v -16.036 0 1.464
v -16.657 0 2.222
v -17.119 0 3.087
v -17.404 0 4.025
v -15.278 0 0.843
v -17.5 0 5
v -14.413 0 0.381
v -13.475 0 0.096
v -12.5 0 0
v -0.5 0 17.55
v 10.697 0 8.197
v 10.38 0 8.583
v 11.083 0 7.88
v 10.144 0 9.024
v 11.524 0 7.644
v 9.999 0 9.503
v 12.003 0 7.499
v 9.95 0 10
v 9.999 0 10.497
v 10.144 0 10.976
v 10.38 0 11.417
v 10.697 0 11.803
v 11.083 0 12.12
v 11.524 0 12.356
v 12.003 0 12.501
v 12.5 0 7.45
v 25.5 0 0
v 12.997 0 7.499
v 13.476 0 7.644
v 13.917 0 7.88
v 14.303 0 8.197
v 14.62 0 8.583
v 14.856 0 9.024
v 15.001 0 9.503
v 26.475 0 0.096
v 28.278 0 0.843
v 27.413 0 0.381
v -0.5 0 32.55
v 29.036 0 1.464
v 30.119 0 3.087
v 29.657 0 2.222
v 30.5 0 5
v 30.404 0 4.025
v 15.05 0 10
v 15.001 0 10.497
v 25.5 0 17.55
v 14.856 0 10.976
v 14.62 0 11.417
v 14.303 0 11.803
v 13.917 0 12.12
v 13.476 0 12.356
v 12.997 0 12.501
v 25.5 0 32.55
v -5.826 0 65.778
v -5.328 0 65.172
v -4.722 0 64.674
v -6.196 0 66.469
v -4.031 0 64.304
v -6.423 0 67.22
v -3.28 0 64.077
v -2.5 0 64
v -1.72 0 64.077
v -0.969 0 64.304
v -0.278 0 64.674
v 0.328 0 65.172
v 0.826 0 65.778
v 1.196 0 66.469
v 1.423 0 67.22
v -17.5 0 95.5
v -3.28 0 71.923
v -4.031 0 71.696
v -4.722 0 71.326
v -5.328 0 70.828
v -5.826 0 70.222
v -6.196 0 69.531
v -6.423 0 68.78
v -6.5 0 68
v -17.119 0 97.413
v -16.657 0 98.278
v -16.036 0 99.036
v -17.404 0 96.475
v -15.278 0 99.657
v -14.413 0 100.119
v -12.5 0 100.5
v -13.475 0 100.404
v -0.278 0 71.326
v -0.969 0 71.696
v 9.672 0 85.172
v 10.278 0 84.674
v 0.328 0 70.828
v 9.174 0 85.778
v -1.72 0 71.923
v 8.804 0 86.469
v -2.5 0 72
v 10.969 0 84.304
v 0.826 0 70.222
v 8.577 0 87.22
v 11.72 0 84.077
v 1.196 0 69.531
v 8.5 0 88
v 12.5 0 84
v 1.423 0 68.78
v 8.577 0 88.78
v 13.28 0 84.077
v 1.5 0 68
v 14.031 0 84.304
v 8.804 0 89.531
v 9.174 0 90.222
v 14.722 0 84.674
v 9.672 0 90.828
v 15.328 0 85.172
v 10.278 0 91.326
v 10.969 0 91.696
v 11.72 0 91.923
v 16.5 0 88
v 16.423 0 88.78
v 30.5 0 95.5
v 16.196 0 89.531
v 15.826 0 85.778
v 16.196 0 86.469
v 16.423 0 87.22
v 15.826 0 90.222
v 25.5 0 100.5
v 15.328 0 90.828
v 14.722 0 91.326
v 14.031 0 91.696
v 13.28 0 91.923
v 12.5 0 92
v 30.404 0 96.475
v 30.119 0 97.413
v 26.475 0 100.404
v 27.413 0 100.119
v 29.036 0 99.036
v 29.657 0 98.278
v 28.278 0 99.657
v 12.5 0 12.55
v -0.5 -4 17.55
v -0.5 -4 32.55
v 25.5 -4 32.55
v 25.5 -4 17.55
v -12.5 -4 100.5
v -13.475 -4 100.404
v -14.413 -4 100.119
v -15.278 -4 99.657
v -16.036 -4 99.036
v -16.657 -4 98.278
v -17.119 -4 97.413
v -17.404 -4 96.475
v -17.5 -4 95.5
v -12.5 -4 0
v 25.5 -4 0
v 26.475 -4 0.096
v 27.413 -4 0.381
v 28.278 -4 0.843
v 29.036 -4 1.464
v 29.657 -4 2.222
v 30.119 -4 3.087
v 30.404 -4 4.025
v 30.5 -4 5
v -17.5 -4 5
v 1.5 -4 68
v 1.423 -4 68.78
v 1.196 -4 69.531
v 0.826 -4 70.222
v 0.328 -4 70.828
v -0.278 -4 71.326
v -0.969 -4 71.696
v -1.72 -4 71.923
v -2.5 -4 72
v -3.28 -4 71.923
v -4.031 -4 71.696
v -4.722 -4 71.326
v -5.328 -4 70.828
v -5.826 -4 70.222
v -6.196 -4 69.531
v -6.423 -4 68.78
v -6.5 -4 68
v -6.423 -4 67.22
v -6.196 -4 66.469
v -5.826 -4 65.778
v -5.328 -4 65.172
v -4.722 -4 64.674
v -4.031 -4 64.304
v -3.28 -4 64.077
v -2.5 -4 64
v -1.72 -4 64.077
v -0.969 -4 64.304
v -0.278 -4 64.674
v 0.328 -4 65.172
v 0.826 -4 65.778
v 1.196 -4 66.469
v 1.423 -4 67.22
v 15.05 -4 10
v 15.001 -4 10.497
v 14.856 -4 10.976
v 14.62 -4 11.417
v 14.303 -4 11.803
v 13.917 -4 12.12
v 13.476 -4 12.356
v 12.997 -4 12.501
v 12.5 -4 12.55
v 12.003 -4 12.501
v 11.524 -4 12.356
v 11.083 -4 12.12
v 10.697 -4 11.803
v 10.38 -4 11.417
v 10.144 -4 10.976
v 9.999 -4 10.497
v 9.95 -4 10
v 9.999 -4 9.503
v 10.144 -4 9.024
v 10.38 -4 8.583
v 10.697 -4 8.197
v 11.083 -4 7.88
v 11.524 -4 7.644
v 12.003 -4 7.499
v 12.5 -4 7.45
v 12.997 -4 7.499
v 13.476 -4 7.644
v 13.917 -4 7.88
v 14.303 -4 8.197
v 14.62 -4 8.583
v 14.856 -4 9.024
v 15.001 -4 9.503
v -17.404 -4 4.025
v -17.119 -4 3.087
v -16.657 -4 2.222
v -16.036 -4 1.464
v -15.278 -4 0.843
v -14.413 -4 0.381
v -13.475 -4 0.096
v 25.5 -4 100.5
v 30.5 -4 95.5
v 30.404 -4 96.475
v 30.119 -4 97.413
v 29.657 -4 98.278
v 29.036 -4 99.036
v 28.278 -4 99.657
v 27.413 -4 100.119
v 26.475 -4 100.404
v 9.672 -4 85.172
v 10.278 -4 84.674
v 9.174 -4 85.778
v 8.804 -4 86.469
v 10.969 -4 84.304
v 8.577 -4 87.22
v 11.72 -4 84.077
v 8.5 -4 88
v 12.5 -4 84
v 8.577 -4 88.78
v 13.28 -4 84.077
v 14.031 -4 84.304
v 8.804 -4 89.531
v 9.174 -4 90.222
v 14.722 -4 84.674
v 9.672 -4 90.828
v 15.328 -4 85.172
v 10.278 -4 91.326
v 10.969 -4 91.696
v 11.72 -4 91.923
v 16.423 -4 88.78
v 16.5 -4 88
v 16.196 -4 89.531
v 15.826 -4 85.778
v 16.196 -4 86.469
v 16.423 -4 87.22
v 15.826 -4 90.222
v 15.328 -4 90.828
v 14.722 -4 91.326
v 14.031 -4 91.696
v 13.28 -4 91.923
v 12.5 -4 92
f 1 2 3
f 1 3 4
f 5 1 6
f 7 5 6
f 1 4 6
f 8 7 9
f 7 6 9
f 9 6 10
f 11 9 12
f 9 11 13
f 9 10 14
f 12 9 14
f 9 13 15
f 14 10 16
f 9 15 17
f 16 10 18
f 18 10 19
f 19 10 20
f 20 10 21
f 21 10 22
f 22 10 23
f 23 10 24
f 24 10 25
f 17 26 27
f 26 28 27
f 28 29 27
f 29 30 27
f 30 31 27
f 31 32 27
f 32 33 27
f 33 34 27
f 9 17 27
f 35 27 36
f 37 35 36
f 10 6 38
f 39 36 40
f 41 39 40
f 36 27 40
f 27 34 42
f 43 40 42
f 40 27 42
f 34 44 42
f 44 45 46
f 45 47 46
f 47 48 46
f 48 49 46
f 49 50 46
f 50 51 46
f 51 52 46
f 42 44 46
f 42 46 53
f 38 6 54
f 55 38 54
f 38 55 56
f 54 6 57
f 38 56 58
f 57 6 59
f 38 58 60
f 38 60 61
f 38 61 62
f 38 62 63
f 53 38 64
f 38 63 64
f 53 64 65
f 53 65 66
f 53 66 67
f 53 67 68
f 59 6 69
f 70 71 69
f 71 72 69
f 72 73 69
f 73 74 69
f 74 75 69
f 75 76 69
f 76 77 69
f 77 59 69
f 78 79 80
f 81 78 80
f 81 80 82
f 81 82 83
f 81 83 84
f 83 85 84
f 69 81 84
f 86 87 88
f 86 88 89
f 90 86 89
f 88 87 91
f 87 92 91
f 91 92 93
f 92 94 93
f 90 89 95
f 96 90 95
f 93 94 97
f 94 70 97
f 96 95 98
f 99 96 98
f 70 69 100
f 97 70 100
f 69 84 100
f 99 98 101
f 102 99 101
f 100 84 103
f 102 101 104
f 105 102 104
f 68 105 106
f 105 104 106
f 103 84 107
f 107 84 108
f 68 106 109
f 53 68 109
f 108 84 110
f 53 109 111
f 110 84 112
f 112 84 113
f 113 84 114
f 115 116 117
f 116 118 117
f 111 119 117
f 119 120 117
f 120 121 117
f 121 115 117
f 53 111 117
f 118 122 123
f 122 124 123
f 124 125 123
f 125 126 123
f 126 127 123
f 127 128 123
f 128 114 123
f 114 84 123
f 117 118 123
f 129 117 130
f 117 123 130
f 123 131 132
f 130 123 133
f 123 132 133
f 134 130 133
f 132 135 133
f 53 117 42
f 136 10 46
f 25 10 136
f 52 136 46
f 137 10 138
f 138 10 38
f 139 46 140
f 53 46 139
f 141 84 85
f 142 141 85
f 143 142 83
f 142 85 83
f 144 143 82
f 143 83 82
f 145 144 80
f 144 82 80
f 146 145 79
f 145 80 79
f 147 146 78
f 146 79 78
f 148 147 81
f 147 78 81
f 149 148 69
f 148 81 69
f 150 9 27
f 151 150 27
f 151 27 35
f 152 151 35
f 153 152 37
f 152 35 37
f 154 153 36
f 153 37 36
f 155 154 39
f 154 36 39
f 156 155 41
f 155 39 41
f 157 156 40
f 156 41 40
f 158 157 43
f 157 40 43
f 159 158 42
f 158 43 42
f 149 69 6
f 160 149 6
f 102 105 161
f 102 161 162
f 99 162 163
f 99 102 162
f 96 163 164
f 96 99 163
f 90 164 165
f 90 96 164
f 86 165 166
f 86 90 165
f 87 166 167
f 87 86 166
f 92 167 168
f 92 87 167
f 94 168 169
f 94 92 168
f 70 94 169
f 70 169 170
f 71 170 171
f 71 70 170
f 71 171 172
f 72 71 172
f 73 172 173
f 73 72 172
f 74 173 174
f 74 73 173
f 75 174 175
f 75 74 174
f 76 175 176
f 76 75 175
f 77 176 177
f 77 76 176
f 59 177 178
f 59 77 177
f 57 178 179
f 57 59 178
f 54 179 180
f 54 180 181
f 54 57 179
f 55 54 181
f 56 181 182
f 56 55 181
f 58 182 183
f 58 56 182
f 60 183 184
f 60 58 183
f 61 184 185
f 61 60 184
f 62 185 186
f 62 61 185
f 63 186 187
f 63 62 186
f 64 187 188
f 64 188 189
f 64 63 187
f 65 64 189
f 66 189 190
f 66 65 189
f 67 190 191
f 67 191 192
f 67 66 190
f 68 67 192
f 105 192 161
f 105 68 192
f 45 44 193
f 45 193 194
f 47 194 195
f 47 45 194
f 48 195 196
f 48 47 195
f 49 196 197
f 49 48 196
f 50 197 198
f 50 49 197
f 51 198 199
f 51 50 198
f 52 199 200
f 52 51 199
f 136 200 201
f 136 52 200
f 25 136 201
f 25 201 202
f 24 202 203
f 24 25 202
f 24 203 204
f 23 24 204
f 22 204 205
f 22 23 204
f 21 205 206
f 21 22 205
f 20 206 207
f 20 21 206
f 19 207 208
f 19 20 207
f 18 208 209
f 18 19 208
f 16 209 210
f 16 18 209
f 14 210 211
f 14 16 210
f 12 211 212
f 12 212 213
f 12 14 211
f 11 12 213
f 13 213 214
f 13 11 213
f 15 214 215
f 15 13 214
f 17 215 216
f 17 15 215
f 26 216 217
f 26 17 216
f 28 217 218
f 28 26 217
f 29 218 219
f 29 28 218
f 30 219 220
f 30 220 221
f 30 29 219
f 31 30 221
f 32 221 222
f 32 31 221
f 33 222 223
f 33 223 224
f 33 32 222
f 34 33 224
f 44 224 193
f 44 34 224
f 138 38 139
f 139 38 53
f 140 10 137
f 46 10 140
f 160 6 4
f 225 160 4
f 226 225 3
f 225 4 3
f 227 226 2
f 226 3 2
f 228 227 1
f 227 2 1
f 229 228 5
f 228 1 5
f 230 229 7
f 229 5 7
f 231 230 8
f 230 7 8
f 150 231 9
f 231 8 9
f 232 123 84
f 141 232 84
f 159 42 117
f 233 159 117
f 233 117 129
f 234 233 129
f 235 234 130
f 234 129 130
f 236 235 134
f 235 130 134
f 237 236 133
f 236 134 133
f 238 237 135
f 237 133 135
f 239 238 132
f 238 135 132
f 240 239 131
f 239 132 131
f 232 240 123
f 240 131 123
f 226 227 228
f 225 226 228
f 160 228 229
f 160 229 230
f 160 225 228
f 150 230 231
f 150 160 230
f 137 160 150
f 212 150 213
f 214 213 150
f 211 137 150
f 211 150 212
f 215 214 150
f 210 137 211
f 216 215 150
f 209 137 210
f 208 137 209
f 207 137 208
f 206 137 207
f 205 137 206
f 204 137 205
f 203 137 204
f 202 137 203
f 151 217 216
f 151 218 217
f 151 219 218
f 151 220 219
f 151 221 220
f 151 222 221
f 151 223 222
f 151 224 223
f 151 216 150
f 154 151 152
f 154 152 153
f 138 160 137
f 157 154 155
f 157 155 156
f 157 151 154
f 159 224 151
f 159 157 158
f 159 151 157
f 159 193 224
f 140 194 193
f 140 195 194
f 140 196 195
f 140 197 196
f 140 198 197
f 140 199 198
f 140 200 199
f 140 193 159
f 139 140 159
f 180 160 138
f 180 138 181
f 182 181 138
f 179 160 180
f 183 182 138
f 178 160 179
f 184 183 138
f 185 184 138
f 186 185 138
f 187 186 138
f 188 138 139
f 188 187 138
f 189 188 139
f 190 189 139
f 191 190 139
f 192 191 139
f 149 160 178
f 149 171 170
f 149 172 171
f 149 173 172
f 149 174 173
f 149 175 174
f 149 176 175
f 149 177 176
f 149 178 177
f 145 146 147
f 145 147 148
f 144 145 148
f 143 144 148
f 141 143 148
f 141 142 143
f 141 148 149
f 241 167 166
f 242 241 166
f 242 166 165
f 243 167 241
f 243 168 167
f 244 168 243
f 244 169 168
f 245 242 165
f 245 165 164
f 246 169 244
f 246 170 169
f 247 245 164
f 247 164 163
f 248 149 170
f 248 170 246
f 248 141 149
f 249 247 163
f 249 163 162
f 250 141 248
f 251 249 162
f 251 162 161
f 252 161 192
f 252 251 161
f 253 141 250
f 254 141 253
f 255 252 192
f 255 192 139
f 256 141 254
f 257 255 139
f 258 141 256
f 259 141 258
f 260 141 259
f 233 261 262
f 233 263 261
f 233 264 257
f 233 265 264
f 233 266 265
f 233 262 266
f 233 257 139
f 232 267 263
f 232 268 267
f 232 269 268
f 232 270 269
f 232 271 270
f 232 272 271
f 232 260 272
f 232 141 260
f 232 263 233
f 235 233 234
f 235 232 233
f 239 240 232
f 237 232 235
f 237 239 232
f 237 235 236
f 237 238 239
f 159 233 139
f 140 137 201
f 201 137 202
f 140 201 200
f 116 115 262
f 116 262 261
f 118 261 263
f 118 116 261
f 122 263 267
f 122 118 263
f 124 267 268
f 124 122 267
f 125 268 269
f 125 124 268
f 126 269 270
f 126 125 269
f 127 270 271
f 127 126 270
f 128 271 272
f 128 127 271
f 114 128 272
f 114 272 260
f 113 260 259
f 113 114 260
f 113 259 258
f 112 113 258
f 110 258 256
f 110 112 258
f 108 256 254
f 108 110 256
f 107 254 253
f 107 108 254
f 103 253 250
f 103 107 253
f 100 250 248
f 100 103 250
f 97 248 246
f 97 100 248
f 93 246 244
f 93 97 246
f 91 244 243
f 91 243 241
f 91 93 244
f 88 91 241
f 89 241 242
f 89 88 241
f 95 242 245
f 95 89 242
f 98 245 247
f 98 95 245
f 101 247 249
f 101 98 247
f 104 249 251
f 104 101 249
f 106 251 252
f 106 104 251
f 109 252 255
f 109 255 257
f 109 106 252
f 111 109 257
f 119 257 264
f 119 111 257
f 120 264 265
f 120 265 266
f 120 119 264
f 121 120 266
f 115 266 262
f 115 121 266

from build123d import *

# Parameters (mm, degrees)
F0_R     = 2.55
F0_W     = 26
F0_H     = 15
F0_R_2   = 4
F1_DEPTH = 4


with BuildPart() as f1:
    # F0 (on Front) → F1 (new body)
    with BuildSketch(Plane.XZ):
        with BuildLine():
            Line((-17.5, 95.5), (-17.5, 5))
            ThreePointArc((-17.5, 5), (-16.035534, 1.464466), (-12.5, 0))
            Line((-12.5, 0), (25.5, 0))
            ThreePointArc((25.5, 0), (29.035534, 1.464466), (30.5, 5))
            Line((30.5, 5), (30.5, 95.5))
            ThreePointArc((30.5, 95.5), (29.035534, 99.035534), (25.5, 100.5))
            Line((25.5, 100.5), (-12.5, 100.5))
            ThreePointArc((-12.5, 100.5), (-16.035534, 99.035534), (-17.5, 95.5))
        make_face()
        with Locations((12.5, 10)):
            Circle(F0_R, mode=Mode.SUBTRACT)
        with Locations((12.5, 25.05)):
            Rectangle(F0_W, F0_H, mode=Mode.SUBTRACT)
        with Locations((-2.5, 68)):
            Circle(F0_R_2, mode=Mode.SUBTRACT)
        with Locations((12.5, 88)):
            Circle(F0_R_2, mode=Mode.SUBTRACT)
    extrude(amount=F1_DEPTH)


solid = f1.part
